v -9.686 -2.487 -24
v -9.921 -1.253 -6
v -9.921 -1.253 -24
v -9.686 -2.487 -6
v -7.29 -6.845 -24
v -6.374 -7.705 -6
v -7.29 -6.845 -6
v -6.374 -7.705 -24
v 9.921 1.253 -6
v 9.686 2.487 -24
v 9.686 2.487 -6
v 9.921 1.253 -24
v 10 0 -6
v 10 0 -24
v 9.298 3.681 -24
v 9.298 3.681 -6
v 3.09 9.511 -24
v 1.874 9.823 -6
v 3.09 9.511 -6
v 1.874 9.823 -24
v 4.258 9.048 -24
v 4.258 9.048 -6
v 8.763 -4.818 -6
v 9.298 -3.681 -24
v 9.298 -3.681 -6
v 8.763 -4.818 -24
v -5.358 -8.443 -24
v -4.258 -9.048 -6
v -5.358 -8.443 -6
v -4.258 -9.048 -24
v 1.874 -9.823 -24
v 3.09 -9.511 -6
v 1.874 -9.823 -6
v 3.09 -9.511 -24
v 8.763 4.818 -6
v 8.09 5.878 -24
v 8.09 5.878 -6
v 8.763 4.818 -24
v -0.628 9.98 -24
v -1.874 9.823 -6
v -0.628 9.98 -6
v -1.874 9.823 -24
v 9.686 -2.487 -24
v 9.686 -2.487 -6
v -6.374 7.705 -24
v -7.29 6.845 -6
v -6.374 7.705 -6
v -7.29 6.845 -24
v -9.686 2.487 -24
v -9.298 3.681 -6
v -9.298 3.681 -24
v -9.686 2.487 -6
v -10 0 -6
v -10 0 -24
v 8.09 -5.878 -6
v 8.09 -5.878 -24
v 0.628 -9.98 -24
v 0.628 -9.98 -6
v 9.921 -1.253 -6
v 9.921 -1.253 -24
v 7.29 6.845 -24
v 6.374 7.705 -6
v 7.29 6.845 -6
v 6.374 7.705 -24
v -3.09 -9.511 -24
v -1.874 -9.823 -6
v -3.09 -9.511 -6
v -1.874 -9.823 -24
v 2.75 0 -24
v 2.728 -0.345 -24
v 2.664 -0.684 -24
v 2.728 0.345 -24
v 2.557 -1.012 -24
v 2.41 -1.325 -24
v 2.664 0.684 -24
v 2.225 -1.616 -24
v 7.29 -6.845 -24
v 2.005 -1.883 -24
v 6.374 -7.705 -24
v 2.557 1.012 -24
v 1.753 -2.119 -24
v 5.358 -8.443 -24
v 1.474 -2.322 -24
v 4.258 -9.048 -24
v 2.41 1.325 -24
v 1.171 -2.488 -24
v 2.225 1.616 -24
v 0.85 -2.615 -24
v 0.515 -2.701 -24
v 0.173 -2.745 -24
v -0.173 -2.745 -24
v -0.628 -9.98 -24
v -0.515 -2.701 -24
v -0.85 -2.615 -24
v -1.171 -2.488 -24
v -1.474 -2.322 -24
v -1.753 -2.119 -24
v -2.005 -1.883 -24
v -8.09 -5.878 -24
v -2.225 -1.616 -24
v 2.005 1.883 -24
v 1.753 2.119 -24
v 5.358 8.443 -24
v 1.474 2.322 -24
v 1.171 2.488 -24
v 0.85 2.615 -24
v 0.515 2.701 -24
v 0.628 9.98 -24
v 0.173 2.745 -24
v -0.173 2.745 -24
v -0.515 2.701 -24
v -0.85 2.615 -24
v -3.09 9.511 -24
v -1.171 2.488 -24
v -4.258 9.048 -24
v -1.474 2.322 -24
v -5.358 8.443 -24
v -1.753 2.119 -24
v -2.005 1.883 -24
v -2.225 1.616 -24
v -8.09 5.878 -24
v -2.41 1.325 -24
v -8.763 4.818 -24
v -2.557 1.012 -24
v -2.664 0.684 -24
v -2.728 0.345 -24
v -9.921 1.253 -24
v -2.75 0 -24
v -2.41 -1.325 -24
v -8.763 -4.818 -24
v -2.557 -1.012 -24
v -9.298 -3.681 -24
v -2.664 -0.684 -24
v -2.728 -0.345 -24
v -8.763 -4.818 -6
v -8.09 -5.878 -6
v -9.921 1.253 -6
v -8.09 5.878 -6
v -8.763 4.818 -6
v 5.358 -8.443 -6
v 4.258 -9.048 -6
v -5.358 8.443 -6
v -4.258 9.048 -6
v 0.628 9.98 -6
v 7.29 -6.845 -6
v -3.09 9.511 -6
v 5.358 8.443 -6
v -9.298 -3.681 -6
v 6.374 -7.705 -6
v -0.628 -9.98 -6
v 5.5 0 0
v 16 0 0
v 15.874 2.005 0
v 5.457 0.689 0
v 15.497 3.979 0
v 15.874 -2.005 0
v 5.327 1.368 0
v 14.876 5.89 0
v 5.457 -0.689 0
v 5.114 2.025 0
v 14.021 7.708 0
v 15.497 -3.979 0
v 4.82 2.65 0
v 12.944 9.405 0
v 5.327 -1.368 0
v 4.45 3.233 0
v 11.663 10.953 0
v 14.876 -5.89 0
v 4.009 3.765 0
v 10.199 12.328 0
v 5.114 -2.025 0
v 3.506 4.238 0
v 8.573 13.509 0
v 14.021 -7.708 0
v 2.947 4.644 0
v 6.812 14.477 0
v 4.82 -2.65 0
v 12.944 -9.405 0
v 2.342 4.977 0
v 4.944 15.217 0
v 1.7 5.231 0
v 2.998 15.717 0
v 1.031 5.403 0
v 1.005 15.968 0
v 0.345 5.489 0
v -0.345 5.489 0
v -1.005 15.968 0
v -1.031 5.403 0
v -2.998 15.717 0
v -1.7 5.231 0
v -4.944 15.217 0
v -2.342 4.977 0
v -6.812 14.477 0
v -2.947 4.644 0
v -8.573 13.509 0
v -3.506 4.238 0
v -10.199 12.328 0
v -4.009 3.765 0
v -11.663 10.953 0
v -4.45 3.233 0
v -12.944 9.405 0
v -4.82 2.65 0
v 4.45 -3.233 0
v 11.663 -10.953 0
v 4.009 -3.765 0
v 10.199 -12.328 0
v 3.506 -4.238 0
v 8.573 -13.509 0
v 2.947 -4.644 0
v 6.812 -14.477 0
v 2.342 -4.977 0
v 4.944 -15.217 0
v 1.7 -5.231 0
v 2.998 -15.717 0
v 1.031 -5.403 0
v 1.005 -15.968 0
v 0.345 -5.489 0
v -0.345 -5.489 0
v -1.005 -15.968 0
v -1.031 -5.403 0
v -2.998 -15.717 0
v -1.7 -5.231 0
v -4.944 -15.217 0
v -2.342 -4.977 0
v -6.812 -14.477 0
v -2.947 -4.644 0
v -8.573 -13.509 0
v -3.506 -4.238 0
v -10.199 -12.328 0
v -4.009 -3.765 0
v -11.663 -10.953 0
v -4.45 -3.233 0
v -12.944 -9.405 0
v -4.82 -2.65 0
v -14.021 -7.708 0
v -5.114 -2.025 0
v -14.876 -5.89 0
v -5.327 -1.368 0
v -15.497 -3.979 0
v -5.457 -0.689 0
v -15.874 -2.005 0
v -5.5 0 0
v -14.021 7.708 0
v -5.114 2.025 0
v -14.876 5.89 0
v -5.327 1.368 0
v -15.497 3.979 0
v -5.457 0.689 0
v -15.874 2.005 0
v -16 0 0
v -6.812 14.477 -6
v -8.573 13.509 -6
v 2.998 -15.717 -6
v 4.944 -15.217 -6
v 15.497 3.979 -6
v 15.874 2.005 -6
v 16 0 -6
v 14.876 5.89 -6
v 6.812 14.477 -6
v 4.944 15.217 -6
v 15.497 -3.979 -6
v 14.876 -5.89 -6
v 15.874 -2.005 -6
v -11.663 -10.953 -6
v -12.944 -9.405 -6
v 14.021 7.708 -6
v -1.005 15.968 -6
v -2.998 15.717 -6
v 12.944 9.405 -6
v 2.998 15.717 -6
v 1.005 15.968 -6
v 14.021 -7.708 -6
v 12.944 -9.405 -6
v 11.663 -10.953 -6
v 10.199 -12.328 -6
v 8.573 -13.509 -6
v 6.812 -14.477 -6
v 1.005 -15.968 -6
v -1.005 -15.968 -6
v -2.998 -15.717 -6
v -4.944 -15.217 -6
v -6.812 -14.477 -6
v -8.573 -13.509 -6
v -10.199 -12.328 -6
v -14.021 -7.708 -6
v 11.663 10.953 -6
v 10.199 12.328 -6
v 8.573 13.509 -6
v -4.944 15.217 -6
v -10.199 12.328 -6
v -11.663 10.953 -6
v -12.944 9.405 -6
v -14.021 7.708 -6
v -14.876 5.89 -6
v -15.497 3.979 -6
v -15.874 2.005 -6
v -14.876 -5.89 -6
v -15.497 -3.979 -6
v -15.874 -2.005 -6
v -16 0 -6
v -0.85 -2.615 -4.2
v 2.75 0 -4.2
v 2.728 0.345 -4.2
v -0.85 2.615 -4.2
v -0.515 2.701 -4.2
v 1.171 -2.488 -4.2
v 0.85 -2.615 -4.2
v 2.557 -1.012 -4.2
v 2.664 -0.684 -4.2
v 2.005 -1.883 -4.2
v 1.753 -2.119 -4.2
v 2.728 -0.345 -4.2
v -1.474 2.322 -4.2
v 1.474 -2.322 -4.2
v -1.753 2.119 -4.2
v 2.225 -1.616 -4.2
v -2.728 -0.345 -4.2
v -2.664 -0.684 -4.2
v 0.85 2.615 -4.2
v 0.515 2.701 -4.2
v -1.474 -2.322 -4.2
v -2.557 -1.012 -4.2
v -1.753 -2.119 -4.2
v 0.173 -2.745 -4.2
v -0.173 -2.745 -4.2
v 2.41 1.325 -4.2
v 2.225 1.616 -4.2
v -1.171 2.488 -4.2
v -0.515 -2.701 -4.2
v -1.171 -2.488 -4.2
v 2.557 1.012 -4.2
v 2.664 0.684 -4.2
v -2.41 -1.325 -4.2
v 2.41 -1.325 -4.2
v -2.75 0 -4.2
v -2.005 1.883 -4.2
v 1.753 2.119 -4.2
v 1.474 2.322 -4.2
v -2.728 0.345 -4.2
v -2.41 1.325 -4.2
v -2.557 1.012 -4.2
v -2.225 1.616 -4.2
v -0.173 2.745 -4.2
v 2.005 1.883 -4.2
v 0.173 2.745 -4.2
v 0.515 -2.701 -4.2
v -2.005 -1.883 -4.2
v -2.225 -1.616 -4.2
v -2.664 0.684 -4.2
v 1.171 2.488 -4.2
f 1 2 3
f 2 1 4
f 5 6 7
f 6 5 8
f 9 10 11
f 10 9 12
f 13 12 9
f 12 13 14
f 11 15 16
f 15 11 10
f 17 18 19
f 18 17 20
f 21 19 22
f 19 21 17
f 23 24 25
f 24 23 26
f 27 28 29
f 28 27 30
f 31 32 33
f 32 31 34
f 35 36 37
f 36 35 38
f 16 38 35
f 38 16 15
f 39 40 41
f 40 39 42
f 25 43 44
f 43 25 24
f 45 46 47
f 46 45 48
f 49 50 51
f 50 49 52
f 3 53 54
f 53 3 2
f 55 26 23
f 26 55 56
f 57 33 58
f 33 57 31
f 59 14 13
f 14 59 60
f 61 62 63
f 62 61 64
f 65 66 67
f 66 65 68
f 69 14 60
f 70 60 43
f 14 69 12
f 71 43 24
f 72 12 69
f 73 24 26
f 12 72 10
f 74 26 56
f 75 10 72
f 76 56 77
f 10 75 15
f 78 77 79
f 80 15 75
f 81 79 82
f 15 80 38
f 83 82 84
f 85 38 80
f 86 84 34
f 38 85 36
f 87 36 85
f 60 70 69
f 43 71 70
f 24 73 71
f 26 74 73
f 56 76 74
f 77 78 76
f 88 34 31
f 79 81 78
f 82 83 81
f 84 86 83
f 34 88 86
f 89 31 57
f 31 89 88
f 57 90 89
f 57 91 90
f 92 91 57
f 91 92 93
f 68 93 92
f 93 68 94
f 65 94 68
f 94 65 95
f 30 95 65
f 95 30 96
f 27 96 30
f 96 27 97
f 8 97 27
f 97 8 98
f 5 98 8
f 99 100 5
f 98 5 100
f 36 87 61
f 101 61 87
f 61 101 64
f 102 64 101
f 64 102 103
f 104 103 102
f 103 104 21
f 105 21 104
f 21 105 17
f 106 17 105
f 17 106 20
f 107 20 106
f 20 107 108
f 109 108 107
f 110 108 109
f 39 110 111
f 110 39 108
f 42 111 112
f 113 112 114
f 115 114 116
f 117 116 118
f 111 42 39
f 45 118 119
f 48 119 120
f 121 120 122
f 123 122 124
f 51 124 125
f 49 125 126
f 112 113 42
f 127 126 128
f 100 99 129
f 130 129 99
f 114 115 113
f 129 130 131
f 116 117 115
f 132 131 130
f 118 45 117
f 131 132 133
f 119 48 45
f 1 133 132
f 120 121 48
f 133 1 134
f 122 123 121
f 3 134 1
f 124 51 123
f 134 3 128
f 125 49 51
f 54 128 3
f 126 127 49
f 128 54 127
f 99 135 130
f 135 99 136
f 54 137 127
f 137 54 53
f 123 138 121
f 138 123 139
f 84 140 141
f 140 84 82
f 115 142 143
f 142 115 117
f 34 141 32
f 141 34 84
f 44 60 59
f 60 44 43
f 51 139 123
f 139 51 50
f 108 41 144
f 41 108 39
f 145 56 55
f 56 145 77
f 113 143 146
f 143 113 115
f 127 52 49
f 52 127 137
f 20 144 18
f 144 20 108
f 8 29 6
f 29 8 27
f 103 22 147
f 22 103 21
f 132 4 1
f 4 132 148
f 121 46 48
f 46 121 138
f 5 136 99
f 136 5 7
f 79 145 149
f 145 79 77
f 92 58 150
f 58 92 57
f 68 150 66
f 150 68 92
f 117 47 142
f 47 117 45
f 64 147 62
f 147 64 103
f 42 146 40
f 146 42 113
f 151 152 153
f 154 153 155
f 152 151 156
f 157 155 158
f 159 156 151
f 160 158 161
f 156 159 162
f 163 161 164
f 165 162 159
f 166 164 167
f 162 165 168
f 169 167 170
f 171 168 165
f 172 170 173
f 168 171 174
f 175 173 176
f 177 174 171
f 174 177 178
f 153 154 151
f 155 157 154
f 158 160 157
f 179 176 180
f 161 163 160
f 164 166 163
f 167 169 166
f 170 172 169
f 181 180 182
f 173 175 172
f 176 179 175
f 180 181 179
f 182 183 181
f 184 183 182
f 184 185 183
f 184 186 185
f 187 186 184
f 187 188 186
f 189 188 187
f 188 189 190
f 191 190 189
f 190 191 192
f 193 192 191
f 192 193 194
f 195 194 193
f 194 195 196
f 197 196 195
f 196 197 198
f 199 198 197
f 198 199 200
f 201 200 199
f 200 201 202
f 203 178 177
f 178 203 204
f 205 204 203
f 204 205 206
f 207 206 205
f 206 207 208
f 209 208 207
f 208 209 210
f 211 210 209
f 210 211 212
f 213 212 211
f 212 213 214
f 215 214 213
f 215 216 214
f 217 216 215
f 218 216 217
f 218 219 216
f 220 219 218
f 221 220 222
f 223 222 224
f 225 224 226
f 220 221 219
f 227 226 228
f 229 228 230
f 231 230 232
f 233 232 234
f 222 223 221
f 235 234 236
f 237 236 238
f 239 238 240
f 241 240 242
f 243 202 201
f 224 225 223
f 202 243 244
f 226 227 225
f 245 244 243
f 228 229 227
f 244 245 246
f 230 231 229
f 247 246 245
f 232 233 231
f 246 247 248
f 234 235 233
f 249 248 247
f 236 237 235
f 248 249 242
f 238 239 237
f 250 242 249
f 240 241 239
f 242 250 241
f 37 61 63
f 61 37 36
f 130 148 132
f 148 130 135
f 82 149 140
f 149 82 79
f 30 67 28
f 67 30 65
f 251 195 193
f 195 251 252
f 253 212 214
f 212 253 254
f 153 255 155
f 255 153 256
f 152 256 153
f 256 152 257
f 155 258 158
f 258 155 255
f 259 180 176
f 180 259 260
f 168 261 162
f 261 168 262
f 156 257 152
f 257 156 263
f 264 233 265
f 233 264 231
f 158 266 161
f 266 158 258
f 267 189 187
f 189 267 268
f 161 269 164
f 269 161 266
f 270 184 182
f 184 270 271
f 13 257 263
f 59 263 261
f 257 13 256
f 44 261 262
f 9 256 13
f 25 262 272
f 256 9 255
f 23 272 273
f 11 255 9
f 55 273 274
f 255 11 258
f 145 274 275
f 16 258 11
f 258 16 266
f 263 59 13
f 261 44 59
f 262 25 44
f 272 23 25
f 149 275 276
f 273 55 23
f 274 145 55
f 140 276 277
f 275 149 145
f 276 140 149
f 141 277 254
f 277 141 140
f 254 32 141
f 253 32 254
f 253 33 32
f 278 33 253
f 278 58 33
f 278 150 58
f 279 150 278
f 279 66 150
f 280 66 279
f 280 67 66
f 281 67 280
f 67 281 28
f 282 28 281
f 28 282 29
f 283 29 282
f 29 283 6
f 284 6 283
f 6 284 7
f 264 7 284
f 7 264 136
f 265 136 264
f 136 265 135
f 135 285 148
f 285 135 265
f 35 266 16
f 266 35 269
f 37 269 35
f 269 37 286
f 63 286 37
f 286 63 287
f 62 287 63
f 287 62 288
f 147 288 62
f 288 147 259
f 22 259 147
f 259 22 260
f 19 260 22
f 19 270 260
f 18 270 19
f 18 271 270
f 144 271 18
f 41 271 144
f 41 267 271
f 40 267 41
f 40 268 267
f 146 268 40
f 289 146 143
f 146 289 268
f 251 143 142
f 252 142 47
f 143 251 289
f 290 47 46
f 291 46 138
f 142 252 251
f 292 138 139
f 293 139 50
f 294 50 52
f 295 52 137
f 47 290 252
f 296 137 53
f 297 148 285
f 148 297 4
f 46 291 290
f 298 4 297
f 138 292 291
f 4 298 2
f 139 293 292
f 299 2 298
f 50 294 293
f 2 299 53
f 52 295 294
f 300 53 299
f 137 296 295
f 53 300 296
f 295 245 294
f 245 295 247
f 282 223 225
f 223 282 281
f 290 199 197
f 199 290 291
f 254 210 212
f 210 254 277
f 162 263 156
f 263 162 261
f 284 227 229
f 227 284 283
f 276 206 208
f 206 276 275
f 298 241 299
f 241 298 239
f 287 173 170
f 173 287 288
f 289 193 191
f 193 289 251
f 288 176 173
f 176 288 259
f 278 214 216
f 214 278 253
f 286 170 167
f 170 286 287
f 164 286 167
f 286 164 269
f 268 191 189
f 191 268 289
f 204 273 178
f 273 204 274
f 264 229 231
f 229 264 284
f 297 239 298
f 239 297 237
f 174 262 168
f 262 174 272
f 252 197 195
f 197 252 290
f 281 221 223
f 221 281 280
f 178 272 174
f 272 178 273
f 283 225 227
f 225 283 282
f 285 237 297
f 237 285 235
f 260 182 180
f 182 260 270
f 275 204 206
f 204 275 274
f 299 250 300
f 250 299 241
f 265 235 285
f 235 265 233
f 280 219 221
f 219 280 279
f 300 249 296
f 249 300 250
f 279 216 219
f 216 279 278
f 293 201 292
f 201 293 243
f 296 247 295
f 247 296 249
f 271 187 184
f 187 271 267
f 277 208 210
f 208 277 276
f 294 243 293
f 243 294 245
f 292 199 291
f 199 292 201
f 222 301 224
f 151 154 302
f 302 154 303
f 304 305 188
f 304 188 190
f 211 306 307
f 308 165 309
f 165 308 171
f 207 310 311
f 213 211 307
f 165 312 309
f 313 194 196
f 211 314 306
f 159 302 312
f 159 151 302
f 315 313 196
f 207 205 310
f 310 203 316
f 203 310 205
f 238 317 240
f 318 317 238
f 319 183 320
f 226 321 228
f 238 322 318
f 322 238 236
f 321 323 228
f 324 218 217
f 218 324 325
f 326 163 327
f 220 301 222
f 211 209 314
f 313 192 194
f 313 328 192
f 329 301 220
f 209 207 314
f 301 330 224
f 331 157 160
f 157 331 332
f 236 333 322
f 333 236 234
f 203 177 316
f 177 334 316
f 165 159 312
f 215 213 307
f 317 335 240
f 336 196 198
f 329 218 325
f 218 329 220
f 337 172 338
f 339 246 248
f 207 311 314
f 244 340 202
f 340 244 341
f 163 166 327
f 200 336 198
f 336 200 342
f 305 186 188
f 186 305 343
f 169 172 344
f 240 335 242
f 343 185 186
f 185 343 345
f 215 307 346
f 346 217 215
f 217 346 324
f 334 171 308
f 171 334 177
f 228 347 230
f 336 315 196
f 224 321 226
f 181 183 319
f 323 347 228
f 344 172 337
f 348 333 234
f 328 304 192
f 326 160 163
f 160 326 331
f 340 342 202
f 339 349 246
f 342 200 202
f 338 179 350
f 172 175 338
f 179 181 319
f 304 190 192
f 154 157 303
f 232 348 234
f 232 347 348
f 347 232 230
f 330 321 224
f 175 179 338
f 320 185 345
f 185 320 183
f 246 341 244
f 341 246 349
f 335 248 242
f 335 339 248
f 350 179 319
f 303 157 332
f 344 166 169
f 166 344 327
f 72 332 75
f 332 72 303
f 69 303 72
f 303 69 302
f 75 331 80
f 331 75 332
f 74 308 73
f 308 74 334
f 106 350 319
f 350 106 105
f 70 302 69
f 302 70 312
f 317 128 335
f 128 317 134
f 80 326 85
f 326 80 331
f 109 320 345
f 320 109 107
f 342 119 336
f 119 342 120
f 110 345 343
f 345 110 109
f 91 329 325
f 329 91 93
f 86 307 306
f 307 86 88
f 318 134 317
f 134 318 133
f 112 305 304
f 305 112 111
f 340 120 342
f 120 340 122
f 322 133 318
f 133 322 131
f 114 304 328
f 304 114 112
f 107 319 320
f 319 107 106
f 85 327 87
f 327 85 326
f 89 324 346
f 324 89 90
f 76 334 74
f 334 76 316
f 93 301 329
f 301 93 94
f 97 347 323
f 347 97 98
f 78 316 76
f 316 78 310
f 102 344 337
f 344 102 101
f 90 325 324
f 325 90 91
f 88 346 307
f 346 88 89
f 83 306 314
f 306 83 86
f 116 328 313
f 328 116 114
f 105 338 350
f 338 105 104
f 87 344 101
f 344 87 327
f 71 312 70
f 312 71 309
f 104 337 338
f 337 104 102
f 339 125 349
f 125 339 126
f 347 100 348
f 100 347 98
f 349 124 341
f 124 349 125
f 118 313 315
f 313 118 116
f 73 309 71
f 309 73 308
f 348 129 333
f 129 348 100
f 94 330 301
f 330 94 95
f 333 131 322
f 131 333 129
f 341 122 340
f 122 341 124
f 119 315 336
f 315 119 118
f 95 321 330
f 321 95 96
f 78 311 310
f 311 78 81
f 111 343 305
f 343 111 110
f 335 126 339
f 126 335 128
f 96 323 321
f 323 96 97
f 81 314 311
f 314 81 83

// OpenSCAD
$fn = 50;


difference() {
	union() {
		translate(v = [0, 0, -24.0000000000]) {
			cylinder(h = 24, r = 10.0000000000);
		}
		translate(v = [0, 0, -6.0000000000]) {
			cylinder(h = 6, r = 16.0000000000);
		}
	}
	union() {
		translate(v = [0, 0, 0]) {
			rotate(a = [0, 0, 0]) {
				difference() {
					union() {
						#translate(v = [0, 0, -24.0000000000]) {
							cylinder(h = 24, r = 2.2500000000);
						}
						#translate(v = [0, 0, -4.2000000000]) {
							cylinder(h = 4.2000000000, r = 10.0000000000, r1 = 2.7500000000, r2 = 5.5000000000);
						}
						#translate(v = [0, 0, -24.0000000000]) {
							cylinder(h = 24, r = 2.7500000000);
						}
						#translate(v = [0, 0, -24.0000000000]) {
							cylinder(h = 24, r = 2.2500000000);
						}
					}
					union();
				}
			}
		}
	}
}
